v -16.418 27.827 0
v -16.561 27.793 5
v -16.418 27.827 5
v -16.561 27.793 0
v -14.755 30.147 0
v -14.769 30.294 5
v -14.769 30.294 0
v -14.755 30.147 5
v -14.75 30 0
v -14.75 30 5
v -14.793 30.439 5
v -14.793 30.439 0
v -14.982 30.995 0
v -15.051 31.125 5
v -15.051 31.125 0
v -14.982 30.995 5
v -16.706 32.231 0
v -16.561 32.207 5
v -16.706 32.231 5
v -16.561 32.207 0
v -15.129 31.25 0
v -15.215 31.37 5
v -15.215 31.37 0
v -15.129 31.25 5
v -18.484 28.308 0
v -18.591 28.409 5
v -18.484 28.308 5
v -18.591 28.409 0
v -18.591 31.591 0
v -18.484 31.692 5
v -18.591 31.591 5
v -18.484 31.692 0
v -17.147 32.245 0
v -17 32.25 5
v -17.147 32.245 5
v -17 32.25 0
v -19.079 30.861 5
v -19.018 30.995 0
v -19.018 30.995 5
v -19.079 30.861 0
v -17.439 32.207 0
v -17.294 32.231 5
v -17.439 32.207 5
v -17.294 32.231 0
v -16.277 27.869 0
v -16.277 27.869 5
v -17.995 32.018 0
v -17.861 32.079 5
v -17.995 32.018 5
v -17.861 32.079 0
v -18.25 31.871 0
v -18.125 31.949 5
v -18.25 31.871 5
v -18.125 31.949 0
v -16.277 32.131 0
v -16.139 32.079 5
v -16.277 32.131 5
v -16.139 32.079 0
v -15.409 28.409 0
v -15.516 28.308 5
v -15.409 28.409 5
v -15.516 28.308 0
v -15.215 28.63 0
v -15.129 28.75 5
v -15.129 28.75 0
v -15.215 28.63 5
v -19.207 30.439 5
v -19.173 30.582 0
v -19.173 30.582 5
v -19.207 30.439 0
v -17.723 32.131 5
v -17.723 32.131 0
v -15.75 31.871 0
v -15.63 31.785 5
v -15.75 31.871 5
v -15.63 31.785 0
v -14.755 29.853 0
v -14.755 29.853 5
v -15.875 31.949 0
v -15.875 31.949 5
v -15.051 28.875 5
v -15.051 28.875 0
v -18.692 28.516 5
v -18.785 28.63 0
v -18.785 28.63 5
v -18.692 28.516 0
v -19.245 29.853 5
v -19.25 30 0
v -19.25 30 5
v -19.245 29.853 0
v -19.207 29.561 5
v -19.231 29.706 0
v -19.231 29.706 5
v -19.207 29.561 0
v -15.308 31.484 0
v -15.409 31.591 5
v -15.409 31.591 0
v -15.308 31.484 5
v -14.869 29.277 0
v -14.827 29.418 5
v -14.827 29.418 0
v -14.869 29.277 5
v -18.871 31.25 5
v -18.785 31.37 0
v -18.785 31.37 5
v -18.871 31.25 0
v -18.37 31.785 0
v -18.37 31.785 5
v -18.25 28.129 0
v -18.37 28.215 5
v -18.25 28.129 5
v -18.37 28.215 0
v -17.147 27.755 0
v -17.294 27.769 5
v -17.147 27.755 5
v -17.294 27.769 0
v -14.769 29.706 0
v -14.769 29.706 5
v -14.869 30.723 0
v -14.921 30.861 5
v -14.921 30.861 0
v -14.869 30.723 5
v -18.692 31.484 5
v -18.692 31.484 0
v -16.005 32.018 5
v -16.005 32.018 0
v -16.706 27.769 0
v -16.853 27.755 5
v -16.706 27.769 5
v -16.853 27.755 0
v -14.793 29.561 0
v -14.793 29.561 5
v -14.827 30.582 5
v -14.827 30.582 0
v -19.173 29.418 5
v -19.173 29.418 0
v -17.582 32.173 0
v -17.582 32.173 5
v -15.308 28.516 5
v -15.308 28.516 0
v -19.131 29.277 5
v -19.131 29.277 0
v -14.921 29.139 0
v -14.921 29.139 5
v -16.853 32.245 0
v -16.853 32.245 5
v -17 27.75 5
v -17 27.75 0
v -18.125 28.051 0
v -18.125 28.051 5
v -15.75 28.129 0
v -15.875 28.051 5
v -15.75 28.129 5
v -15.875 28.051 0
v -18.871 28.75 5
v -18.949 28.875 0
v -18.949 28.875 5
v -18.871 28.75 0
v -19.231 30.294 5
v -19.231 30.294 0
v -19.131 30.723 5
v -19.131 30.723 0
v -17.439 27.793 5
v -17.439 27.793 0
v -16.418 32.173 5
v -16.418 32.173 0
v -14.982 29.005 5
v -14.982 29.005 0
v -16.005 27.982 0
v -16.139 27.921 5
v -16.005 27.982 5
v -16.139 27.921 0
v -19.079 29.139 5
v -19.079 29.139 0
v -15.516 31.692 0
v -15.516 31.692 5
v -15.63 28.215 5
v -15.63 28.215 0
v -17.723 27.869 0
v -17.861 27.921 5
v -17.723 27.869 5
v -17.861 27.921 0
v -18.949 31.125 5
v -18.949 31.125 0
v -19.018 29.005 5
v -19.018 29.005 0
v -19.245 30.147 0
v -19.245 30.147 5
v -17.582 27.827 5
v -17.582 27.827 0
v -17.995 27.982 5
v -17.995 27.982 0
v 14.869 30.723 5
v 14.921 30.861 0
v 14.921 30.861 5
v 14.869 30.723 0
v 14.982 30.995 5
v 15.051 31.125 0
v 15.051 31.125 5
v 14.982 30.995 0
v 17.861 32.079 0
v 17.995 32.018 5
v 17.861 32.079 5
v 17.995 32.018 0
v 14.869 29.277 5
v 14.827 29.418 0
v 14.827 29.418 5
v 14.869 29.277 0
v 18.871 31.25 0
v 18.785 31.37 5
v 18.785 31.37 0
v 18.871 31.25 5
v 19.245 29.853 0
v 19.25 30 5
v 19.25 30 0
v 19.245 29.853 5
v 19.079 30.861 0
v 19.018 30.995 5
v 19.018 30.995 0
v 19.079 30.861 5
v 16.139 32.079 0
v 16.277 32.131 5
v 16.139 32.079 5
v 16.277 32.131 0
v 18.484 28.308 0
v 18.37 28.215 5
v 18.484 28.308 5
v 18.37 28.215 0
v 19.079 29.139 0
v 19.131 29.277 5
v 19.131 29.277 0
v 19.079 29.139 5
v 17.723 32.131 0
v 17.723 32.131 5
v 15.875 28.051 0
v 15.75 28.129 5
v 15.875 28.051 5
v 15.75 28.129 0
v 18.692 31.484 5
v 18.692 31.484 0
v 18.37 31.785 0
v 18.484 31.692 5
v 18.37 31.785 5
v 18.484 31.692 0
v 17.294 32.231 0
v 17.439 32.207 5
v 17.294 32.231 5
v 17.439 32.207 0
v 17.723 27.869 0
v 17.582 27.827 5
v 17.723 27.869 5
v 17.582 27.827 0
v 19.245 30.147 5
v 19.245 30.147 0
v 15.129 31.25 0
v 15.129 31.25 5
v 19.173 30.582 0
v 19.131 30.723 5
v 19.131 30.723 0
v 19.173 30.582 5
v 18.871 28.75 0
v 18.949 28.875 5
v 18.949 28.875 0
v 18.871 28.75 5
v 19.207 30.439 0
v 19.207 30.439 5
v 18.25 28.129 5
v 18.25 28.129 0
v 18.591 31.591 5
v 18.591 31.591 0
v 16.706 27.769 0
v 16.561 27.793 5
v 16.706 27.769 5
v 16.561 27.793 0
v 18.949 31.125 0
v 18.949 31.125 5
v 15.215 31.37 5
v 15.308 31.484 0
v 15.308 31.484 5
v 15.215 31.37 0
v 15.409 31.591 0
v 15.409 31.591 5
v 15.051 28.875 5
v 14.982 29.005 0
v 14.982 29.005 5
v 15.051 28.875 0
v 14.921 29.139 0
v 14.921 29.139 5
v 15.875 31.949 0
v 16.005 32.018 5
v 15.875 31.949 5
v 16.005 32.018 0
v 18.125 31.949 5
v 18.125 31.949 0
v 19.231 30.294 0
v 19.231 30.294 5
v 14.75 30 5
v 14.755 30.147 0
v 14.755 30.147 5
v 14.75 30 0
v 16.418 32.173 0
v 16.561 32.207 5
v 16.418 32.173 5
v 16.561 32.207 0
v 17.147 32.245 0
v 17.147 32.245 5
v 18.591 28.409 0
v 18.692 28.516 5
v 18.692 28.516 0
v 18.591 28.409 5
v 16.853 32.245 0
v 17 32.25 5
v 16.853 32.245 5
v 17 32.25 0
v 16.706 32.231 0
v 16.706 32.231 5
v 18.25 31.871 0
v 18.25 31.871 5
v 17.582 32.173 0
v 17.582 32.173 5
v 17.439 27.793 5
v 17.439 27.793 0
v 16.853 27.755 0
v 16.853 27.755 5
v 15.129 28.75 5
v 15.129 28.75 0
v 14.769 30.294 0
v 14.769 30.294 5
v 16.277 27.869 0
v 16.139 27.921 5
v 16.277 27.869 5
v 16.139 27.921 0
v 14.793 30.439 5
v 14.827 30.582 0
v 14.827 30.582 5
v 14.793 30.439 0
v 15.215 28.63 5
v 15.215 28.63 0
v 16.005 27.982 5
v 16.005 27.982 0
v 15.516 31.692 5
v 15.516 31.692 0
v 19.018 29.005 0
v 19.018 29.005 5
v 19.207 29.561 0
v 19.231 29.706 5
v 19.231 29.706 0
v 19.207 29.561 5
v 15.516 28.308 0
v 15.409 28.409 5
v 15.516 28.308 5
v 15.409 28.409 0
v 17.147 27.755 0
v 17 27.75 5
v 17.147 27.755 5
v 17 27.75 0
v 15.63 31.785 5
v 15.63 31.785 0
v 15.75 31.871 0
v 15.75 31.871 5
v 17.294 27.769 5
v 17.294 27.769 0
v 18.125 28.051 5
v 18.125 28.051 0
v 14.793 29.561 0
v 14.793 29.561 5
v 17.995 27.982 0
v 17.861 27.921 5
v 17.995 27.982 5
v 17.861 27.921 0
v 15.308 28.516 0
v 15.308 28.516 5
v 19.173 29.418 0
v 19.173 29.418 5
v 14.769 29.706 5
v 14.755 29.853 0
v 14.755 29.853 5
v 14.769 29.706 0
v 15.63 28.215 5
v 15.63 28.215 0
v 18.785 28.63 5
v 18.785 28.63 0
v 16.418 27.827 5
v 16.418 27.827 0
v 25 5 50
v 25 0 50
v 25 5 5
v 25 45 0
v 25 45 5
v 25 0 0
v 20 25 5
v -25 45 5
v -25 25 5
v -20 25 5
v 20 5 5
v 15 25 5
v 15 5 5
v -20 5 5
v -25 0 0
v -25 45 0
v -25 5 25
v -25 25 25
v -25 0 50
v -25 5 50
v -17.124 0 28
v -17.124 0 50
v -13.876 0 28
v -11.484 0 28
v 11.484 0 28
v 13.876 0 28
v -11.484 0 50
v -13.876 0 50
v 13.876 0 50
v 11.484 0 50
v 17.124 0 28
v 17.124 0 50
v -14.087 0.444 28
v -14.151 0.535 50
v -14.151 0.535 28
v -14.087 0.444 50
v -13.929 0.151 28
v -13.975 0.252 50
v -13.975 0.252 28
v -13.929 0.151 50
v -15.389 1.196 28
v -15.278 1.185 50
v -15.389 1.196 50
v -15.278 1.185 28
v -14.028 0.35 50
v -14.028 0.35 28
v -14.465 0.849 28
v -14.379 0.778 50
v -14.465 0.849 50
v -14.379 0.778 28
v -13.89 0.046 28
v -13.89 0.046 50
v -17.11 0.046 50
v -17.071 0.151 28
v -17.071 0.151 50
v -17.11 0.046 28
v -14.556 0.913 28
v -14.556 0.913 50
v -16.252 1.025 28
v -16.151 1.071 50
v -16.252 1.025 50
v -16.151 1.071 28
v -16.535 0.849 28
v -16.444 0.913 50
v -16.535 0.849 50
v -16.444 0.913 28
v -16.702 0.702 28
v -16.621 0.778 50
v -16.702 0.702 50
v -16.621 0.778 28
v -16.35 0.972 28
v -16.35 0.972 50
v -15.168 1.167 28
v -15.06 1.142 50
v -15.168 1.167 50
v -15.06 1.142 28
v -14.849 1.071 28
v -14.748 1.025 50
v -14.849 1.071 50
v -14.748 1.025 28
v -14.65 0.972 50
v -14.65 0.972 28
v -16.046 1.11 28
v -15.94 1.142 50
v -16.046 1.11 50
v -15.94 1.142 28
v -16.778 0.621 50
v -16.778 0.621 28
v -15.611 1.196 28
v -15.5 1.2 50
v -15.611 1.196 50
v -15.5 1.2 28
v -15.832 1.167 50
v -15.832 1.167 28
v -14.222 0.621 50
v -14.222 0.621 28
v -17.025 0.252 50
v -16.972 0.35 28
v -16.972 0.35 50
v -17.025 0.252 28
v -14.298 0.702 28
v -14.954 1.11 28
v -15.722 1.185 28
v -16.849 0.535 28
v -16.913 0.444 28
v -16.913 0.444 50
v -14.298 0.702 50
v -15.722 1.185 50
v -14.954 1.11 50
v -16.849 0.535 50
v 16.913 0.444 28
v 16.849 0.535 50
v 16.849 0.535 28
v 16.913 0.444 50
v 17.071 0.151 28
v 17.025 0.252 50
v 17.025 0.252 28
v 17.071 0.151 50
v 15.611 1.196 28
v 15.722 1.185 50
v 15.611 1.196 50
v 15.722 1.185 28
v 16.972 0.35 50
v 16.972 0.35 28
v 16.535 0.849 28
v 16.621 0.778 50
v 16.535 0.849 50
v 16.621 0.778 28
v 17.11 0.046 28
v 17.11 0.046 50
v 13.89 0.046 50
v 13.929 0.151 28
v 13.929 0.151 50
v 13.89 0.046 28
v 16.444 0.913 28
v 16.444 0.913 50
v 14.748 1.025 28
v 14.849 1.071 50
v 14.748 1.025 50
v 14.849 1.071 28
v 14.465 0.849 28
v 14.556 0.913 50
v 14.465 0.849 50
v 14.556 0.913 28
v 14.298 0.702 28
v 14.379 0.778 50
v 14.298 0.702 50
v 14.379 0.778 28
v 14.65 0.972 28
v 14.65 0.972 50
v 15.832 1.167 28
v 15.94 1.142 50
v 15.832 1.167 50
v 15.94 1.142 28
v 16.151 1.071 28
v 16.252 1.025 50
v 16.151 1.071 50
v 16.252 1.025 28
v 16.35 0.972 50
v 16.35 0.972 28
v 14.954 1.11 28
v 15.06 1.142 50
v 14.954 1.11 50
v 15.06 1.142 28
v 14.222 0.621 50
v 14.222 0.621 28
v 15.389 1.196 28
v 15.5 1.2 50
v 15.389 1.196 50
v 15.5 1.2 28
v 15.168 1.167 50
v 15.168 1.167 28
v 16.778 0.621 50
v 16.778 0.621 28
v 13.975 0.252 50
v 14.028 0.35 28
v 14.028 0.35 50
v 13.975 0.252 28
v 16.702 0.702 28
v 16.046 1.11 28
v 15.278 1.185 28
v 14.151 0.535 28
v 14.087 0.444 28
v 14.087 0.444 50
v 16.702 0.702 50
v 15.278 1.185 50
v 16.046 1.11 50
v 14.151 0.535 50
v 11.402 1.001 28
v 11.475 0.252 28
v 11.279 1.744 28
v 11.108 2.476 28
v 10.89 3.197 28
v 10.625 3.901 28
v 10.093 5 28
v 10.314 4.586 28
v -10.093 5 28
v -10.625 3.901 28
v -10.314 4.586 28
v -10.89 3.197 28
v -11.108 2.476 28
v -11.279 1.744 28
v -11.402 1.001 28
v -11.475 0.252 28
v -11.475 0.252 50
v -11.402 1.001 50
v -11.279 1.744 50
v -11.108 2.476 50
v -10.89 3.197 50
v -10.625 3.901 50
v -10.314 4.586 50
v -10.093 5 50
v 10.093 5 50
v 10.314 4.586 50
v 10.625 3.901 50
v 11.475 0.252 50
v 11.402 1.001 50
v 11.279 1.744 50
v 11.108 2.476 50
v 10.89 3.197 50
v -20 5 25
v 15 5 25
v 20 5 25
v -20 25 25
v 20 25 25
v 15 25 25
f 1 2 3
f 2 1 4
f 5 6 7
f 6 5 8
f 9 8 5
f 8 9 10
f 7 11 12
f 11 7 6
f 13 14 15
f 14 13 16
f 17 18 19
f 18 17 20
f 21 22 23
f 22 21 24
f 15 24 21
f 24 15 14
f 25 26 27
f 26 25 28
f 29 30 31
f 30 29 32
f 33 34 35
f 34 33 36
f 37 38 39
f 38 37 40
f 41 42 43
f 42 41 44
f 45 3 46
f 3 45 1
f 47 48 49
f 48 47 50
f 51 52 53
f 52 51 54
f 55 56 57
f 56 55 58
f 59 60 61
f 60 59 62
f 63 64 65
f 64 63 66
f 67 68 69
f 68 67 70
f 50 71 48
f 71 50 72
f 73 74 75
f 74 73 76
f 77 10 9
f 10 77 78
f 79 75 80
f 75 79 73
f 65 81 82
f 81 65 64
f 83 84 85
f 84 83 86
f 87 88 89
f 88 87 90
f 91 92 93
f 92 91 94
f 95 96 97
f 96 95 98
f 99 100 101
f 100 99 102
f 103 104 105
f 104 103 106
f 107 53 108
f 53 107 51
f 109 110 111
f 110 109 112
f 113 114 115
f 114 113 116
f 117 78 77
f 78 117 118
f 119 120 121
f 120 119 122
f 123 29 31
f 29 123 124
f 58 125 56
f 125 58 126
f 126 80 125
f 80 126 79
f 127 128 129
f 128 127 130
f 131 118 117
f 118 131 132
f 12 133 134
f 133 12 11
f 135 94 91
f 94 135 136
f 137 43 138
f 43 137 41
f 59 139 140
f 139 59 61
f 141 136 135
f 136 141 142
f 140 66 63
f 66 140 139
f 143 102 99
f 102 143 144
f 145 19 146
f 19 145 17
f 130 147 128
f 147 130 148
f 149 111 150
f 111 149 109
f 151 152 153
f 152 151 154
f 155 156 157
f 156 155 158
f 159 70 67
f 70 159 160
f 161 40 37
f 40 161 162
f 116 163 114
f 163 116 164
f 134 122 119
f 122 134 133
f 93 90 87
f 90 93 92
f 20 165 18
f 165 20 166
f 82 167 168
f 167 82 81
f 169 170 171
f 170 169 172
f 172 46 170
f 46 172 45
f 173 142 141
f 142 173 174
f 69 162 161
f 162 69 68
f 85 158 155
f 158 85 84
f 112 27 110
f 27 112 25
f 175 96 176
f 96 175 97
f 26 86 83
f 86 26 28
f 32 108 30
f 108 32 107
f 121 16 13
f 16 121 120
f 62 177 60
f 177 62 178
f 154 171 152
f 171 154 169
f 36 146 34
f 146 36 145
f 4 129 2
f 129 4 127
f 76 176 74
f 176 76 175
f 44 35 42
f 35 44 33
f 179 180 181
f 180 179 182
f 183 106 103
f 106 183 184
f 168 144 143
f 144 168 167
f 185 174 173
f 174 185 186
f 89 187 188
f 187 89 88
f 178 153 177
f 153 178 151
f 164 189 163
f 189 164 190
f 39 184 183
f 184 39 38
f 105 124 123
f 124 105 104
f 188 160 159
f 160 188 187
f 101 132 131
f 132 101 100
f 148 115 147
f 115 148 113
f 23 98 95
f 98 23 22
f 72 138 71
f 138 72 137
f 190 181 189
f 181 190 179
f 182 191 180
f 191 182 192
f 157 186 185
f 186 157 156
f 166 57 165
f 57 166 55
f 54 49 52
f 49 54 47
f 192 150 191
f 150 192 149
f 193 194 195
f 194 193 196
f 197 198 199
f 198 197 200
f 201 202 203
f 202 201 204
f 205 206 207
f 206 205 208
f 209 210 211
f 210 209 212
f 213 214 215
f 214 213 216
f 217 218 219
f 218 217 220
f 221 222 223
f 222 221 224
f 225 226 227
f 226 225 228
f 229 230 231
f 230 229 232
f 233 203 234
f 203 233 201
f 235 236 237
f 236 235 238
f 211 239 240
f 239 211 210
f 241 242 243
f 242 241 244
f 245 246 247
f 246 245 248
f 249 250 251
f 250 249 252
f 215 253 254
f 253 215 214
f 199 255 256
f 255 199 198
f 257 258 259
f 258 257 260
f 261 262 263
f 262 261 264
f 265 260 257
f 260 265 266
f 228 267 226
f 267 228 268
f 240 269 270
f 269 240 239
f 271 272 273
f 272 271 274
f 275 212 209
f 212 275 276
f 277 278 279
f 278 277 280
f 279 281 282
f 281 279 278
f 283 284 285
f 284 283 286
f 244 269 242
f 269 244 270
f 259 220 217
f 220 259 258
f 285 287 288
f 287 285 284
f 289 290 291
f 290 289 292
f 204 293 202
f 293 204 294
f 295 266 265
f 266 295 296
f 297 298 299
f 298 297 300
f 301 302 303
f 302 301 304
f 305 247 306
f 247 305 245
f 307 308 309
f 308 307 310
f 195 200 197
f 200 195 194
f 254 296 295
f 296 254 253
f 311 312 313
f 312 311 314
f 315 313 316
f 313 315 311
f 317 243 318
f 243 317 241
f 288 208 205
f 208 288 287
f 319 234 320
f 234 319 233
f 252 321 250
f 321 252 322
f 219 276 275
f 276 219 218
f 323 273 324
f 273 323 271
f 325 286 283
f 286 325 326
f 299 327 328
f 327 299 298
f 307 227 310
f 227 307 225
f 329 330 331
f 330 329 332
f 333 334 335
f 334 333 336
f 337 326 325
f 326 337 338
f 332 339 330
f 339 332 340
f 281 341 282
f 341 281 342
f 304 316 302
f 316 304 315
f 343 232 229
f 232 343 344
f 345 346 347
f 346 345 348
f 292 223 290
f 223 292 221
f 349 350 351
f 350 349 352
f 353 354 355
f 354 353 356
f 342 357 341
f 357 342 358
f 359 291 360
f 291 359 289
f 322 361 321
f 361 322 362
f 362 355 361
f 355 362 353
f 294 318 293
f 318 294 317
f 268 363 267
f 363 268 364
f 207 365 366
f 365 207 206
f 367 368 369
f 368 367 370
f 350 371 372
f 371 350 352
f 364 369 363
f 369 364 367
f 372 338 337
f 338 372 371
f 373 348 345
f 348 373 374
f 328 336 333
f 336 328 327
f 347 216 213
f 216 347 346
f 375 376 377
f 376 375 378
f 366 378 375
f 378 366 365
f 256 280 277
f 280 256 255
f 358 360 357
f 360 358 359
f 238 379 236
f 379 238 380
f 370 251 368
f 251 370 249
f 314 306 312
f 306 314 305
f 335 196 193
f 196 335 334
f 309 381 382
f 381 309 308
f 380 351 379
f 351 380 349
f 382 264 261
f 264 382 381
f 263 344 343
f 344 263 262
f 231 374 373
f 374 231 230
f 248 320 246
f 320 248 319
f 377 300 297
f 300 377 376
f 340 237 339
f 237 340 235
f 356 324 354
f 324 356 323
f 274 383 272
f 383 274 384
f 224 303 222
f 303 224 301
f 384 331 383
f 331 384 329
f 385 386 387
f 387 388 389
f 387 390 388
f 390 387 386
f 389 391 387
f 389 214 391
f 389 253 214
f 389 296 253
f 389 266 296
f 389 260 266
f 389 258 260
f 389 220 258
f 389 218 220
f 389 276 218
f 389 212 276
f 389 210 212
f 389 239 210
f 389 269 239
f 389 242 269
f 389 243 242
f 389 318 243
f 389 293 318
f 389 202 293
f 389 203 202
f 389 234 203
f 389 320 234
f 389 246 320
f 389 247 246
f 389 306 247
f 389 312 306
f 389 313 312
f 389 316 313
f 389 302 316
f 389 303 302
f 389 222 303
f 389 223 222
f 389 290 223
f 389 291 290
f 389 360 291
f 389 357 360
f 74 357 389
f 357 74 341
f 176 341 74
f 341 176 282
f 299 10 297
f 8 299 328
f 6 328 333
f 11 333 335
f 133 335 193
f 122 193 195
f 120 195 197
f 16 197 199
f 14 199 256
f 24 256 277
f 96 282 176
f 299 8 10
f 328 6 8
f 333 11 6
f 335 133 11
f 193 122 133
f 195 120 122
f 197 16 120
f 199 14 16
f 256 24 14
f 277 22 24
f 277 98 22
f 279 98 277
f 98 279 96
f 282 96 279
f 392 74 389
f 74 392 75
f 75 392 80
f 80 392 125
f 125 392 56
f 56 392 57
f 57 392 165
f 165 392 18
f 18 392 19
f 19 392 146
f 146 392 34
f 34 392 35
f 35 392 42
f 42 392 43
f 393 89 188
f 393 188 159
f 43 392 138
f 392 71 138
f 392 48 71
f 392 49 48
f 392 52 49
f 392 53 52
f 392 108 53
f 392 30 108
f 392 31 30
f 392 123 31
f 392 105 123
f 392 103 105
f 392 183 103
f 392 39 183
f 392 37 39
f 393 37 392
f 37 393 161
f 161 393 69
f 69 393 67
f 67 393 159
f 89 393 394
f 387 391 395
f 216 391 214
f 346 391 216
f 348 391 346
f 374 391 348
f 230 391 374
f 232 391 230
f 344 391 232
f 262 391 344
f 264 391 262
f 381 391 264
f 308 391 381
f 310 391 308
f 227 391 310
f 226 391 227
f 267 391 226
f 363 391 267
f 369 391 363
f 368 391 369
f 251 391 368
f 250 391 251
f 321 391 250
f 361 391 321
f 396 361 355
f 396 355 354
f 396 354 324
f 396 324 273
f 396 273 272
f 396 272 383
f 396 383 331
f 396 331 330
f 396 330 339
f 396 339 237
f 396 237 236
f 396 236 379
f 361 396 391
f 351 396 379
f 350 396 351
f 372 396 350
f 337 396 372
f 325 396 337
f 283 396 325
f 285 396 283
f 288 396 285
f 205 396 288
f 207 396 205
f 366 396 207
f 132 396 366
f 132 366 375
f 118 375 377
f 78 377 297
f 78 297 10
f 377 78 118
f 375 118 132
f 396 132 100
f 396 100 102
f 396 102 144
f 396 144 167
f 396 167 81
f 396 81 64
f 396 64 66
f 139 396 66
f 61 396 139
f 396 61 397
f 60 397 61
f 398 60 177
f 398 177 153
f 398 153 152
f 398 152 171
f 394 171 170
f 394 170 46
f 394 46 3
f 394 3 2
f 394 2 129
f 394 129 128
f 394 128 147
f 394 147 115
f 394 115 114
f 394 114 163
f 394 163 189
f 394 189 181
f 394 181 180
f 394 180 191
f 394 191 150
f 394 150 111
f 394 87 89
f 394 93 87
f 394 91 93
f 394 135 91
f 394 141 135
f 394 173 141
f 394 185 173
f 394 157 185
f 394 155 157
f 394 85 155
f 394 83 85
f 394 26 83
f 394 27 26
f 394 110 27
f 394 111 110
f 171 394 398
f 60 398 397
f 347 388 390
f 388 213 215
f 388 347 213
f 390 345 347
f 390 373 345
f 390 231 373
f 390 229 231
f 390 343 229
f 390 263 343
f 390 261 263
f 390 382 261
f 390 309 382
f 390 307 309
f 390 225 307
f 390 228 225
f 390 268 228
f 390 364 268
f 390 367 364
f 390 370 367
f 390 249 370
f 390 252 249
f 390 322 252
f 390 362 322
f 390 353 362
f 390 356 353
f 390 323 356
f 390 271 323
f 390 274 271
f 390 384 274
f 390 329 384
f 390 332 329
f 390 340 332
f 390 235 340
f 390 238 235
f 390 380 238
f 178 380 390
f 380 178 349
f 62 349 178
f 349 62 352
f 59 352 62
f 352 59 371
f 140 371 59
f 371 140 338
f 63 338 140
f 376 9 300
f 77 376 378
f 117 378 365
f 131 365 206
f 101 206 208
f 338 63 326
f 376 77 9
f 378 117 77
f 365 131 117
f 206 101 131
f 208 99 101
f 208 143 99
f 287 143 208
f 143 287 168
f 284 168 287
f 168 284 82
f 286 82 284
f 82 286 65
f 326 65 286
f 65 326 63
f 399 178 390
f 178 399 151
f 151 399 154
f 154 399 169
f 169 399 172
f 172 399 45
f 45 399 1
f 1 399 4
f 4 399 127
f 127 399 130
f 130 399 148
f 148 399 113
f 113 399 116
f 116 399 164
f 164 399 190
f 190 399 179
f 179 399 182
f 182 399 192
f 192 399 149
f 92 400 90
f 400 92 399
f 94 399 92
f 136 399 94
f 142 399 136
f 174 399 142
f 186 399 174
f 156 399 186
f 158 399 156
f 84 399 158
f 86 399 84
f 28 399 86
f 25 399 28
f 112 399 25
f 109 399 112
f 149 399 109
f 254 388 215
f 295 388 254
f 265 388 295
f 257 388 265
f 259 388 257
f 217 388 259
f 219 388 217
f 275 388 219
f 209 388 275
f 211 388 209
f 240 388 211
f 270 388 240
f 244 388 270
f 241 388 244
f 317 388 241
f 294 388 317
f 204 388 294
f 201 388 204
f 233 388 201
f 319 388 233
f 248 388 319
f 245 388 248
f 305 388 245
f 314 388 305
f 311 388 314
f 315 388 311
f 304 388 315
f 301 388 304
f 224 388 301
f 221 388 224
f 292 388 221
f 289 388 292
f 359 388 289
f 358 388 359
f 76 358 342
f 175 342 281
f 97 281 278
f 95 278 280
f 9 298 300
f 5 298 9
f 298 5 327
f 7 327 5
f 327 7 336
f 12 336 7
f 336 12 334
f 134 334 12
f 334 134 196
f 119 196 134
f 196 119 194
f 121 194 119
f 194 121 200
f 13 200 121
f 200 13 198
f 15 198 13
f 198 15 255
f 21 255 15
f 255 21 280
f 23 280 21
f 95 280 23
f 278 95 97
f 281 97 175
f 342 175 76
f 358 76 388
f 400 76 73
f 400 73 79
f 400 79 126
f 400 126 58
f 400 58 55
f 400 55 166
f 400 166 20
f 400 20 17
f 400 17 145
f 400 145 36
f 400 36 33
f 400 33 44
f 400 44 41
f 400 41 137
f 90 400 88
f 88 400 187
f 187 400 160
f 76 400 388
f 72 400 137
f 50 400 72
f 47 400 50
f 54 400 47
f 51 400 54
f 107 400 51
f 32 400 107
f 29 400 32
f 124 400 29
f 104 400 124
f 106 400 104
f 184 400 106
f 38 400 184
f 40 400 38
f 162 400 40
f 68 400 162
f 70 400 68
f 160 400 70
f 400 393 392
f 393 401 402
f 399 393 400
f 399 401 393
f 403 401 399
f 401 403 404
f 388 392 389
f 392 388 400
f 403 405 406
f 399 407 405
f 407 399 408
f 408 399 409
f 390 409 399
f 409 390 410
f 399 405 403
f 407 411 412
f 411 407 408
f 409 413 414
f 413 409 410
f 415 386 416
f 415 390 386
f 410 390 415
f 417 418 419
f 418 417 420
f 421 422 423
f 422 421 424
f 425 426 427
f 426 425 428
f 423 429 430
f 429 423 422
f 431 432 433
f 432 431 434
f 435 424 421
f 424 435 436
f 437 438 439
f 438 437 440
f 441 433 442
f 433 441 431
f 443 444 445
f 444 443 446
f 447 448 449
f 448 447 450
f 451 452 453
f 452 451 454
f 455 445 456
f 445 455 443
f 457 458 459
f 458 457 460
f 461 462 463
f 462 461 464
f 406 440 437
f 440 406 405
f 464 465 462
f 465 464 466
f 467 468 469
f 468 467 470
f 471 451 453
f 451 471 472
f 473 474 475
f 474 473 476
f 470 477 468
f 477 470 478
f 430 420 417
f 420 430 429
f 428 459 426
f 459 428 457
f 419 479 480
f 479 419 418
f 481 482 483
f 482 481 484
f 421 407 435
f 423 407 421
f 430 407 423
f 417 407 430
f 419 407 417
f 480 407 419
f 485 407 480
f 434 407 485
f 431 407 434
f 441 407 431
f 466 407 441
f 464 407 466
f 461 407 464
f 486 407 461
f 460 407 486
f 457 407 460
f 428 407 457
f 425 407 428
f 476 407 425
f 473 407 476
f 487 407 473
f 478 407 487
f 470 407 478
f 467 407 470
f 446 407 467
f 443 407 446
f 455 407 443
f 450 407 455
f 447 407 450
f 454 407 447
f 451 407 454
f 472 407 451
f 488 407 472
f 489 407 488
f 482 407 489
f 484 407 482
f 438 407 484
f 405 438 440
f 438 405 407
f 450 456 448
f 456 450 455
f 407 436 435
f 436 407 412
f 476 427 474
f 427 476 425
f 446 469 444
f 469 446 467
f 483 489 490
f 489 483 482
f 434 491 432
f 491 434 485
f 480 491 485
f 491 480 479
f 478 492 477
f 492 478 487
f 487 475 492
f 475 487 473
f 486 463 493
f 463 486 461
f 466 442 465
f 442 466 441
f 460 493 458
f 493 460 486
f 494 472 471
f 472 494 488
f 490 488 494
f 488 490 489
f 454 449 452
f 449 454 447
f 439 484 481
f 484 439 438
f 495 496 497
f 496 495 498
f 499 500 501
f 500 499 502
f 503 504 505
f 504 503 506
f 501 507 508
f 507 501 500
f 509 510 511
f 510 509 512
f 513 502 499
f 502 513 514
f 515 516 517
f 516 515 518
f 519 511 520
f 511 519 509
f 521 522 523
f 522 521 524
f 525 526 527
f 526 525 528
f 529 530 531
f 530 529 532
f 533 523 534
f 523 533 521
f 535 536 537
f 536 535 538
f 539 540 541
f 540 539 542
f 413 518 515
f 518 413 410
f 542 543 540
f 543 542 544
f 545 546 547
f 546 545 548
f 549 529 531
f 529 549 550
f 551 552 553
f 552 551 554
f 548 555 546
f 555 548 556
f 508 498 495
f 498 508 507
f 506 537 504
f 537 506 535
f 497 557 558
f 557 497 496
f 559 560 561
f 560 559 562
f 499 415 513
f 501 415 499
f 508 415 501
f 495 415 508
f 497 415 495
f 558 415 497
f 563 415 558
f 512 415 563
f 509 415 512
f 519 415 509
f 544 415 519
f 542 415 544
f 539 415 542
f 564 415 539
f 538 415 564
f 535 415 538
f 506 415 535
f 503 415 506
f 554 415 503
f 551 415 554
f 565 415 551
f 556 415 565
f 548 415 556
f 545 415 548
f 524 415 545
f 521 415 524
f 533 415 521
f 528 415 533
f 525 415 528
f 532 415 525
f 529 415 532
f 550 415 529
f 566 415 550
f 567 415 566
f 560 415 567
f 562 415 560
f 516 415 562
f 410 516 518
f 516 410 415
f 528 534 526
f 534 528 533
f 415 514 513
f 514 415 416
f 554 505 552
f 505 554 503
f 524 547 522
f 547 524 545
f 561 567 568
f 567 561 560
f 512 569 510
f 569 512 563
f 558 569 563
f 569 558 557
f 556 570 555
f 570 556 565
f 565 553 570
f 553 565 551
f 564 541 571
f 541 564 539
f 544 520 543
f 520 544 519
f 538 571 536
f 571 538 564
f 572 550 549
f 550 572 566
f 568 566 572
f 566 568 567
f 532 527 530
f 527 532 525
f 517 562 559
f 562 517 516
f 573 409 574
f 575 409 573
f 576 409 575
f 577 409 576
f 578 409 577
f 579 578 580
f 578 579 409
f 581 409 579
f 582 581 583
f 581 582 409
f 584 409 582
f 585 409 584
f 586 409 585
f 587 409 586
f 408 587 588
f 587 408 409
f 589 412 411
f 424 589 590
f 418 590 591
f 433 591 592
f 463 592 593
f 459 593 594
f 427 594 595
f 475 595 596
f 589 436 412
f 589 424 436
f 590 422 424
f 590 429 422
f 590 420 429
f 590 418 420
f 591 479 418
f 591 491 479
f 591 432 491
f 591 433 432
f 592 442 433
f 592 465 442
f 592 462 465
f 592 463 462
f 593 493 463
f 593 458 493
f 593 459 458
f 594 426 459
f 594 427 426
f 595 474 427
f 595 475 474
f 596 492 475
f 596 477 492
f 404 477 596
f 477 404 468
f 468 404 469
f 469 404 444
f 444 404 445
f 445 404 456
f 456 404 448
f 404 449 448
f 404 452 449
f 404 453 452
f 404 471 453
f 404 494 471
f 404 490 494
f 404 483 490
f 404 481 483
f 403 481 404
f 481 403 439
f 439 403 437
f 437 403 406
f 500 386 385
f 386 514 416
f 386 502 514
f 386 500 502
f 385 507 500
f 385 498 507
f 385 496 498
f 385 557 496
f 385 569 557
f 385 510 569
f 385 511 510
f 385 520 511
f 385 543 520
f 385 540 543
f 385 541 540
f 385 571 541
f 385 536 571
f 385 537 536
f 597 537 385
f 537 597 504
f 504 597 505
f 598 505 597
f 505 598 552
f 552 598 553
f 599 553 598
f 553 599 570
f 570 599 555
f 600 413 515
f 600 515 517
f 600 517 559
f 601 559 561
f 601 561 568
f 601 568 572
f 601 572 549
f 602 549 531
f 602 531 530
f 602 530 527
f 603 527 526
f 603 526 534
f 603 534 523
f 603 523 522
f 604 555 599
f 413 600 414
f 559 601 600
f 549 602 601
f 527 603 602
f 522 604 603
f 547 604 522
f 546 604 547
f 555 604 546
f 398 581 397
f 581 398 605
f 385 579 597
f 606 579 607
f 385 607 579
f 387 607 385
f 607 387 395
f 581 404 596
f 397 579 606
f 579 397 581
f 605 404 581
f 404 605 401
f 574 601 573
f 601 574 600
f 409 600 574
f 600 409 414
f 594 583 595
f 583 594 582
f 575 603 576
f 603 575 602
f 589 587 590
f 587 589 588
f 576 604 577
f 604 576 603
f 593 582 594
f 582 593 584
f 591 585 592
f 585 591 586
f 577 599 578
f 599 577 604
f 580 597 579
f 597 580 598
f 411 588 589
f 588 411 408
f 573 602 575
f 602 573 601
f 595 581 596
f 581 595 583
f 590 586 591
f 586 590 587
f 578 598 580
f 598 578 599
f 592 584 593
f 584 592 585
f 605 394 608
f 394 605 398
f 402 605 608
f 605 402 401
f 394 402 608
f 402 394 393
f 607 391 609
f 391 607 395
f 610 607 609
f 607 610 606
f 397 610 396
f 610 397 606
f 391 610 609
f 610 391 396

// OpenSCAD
// L-shaped mounting bracket for NEMA 17 stepper motor (e.g. syringe pump)
// Print orientation: base plate on the bed, motor plate building up in +Z

// ---------------- Parameters ----------------
plate_t      = 5;     // base plate thickness (Z)
base_x       = 25;    // base plate extends from -25 to +25 in X
base_y       = 45;    // base plate extends from 0 to 45 in Y
base_h       = 5;     // base plate height (same as plate_t)

hole_m4_x    = 17;    // M4 through-holes in base plate at x = -17 and +17
hole_m4_y    = 30;    // M4 through-holes in base plate at y = 30
hole_m4_d    = 4.5;   // M4 hole diameter

plate_z      = 50;    // motor plate height (Z)
plate_y      = 5;     // motor plate extends from 0 to 5 in Y
motor_boss_d = 23;    // motor centring boss hole diameter
motor_boss_x = 0;     // motor boss hole centre X
motor_boss_z = 28;    // motor boss hole centre Z

screw_d      = 3.4;   // M3 screw holes
screw_n      = 4;     // number of screw holes
screw_pitch  = 31;    // square pattern side length
screw_x      = 0;     // screw pattern centre X
screw_z      = 28;    // screw pattern centre Z

gusset_t     = 5;     // gusset thickness (X)
gusset_y     = 20;    // gusset leg along +Y
gusset_z     = 20;    // gusset leg along +Z
gusset_x0    = -25;   // left gusset start X
gusset_x1    = 20;    // right gusset start X

eps          = 0.5;   // cutter overshoot past faces
$fn          = 96;    // curve resolution

// ---------------- Model ----------------
union() {
    // Base plate with M4 through-holes
    difference() {
        translate([-base_x, 0, 0])
            cube([2 * base_x, base_y, base_h]);
        for (sx = [-1, 1])
            translate([sx * hole_m4_x, hole_m4_y, -eps])
                cylinder(d = hole_m4_d, h = base_h + 2 * eps);
    }

    // Vertical motor plate with boss hole and M3 screw holes
    difference() {
        translate([-base_x, 0, 0])
            cube([2 * base_x, plate_y, plate_z]);
        translate([motor_boss_x, -eps, motor_boss_z])
            cylinder(d = motor_boss_d, h = plate_z + 2 * eps);
        for (i = [0 : screw_n - 1]) {
            a = (i - screw_n / 2) * screw_pitch;
            translate([screw_x + a / 2, -eps, screw_z])
                cylinder(d = screw_d, h = plate_z + 2 * eps);
            translate([screw_x - a / 2, -eps, screw_z])
                cylinder(d = screw_d, h = plate_z + 2 * eps);
        }
    }

    // Left triangular gusset (right-angle corner at y = 5, z = 5)
    translate([gusset_x0, 5, 5])
        cube([gusset_t, gusset_y, gusset_z]);

    // Right triangular gusset (right-angle corner at y = 5, z = 5)
    translate([gusset_x1 - gusset_t, 5, 5])
        cube([gusset_t, gusset_y, gusset_z]);
}
